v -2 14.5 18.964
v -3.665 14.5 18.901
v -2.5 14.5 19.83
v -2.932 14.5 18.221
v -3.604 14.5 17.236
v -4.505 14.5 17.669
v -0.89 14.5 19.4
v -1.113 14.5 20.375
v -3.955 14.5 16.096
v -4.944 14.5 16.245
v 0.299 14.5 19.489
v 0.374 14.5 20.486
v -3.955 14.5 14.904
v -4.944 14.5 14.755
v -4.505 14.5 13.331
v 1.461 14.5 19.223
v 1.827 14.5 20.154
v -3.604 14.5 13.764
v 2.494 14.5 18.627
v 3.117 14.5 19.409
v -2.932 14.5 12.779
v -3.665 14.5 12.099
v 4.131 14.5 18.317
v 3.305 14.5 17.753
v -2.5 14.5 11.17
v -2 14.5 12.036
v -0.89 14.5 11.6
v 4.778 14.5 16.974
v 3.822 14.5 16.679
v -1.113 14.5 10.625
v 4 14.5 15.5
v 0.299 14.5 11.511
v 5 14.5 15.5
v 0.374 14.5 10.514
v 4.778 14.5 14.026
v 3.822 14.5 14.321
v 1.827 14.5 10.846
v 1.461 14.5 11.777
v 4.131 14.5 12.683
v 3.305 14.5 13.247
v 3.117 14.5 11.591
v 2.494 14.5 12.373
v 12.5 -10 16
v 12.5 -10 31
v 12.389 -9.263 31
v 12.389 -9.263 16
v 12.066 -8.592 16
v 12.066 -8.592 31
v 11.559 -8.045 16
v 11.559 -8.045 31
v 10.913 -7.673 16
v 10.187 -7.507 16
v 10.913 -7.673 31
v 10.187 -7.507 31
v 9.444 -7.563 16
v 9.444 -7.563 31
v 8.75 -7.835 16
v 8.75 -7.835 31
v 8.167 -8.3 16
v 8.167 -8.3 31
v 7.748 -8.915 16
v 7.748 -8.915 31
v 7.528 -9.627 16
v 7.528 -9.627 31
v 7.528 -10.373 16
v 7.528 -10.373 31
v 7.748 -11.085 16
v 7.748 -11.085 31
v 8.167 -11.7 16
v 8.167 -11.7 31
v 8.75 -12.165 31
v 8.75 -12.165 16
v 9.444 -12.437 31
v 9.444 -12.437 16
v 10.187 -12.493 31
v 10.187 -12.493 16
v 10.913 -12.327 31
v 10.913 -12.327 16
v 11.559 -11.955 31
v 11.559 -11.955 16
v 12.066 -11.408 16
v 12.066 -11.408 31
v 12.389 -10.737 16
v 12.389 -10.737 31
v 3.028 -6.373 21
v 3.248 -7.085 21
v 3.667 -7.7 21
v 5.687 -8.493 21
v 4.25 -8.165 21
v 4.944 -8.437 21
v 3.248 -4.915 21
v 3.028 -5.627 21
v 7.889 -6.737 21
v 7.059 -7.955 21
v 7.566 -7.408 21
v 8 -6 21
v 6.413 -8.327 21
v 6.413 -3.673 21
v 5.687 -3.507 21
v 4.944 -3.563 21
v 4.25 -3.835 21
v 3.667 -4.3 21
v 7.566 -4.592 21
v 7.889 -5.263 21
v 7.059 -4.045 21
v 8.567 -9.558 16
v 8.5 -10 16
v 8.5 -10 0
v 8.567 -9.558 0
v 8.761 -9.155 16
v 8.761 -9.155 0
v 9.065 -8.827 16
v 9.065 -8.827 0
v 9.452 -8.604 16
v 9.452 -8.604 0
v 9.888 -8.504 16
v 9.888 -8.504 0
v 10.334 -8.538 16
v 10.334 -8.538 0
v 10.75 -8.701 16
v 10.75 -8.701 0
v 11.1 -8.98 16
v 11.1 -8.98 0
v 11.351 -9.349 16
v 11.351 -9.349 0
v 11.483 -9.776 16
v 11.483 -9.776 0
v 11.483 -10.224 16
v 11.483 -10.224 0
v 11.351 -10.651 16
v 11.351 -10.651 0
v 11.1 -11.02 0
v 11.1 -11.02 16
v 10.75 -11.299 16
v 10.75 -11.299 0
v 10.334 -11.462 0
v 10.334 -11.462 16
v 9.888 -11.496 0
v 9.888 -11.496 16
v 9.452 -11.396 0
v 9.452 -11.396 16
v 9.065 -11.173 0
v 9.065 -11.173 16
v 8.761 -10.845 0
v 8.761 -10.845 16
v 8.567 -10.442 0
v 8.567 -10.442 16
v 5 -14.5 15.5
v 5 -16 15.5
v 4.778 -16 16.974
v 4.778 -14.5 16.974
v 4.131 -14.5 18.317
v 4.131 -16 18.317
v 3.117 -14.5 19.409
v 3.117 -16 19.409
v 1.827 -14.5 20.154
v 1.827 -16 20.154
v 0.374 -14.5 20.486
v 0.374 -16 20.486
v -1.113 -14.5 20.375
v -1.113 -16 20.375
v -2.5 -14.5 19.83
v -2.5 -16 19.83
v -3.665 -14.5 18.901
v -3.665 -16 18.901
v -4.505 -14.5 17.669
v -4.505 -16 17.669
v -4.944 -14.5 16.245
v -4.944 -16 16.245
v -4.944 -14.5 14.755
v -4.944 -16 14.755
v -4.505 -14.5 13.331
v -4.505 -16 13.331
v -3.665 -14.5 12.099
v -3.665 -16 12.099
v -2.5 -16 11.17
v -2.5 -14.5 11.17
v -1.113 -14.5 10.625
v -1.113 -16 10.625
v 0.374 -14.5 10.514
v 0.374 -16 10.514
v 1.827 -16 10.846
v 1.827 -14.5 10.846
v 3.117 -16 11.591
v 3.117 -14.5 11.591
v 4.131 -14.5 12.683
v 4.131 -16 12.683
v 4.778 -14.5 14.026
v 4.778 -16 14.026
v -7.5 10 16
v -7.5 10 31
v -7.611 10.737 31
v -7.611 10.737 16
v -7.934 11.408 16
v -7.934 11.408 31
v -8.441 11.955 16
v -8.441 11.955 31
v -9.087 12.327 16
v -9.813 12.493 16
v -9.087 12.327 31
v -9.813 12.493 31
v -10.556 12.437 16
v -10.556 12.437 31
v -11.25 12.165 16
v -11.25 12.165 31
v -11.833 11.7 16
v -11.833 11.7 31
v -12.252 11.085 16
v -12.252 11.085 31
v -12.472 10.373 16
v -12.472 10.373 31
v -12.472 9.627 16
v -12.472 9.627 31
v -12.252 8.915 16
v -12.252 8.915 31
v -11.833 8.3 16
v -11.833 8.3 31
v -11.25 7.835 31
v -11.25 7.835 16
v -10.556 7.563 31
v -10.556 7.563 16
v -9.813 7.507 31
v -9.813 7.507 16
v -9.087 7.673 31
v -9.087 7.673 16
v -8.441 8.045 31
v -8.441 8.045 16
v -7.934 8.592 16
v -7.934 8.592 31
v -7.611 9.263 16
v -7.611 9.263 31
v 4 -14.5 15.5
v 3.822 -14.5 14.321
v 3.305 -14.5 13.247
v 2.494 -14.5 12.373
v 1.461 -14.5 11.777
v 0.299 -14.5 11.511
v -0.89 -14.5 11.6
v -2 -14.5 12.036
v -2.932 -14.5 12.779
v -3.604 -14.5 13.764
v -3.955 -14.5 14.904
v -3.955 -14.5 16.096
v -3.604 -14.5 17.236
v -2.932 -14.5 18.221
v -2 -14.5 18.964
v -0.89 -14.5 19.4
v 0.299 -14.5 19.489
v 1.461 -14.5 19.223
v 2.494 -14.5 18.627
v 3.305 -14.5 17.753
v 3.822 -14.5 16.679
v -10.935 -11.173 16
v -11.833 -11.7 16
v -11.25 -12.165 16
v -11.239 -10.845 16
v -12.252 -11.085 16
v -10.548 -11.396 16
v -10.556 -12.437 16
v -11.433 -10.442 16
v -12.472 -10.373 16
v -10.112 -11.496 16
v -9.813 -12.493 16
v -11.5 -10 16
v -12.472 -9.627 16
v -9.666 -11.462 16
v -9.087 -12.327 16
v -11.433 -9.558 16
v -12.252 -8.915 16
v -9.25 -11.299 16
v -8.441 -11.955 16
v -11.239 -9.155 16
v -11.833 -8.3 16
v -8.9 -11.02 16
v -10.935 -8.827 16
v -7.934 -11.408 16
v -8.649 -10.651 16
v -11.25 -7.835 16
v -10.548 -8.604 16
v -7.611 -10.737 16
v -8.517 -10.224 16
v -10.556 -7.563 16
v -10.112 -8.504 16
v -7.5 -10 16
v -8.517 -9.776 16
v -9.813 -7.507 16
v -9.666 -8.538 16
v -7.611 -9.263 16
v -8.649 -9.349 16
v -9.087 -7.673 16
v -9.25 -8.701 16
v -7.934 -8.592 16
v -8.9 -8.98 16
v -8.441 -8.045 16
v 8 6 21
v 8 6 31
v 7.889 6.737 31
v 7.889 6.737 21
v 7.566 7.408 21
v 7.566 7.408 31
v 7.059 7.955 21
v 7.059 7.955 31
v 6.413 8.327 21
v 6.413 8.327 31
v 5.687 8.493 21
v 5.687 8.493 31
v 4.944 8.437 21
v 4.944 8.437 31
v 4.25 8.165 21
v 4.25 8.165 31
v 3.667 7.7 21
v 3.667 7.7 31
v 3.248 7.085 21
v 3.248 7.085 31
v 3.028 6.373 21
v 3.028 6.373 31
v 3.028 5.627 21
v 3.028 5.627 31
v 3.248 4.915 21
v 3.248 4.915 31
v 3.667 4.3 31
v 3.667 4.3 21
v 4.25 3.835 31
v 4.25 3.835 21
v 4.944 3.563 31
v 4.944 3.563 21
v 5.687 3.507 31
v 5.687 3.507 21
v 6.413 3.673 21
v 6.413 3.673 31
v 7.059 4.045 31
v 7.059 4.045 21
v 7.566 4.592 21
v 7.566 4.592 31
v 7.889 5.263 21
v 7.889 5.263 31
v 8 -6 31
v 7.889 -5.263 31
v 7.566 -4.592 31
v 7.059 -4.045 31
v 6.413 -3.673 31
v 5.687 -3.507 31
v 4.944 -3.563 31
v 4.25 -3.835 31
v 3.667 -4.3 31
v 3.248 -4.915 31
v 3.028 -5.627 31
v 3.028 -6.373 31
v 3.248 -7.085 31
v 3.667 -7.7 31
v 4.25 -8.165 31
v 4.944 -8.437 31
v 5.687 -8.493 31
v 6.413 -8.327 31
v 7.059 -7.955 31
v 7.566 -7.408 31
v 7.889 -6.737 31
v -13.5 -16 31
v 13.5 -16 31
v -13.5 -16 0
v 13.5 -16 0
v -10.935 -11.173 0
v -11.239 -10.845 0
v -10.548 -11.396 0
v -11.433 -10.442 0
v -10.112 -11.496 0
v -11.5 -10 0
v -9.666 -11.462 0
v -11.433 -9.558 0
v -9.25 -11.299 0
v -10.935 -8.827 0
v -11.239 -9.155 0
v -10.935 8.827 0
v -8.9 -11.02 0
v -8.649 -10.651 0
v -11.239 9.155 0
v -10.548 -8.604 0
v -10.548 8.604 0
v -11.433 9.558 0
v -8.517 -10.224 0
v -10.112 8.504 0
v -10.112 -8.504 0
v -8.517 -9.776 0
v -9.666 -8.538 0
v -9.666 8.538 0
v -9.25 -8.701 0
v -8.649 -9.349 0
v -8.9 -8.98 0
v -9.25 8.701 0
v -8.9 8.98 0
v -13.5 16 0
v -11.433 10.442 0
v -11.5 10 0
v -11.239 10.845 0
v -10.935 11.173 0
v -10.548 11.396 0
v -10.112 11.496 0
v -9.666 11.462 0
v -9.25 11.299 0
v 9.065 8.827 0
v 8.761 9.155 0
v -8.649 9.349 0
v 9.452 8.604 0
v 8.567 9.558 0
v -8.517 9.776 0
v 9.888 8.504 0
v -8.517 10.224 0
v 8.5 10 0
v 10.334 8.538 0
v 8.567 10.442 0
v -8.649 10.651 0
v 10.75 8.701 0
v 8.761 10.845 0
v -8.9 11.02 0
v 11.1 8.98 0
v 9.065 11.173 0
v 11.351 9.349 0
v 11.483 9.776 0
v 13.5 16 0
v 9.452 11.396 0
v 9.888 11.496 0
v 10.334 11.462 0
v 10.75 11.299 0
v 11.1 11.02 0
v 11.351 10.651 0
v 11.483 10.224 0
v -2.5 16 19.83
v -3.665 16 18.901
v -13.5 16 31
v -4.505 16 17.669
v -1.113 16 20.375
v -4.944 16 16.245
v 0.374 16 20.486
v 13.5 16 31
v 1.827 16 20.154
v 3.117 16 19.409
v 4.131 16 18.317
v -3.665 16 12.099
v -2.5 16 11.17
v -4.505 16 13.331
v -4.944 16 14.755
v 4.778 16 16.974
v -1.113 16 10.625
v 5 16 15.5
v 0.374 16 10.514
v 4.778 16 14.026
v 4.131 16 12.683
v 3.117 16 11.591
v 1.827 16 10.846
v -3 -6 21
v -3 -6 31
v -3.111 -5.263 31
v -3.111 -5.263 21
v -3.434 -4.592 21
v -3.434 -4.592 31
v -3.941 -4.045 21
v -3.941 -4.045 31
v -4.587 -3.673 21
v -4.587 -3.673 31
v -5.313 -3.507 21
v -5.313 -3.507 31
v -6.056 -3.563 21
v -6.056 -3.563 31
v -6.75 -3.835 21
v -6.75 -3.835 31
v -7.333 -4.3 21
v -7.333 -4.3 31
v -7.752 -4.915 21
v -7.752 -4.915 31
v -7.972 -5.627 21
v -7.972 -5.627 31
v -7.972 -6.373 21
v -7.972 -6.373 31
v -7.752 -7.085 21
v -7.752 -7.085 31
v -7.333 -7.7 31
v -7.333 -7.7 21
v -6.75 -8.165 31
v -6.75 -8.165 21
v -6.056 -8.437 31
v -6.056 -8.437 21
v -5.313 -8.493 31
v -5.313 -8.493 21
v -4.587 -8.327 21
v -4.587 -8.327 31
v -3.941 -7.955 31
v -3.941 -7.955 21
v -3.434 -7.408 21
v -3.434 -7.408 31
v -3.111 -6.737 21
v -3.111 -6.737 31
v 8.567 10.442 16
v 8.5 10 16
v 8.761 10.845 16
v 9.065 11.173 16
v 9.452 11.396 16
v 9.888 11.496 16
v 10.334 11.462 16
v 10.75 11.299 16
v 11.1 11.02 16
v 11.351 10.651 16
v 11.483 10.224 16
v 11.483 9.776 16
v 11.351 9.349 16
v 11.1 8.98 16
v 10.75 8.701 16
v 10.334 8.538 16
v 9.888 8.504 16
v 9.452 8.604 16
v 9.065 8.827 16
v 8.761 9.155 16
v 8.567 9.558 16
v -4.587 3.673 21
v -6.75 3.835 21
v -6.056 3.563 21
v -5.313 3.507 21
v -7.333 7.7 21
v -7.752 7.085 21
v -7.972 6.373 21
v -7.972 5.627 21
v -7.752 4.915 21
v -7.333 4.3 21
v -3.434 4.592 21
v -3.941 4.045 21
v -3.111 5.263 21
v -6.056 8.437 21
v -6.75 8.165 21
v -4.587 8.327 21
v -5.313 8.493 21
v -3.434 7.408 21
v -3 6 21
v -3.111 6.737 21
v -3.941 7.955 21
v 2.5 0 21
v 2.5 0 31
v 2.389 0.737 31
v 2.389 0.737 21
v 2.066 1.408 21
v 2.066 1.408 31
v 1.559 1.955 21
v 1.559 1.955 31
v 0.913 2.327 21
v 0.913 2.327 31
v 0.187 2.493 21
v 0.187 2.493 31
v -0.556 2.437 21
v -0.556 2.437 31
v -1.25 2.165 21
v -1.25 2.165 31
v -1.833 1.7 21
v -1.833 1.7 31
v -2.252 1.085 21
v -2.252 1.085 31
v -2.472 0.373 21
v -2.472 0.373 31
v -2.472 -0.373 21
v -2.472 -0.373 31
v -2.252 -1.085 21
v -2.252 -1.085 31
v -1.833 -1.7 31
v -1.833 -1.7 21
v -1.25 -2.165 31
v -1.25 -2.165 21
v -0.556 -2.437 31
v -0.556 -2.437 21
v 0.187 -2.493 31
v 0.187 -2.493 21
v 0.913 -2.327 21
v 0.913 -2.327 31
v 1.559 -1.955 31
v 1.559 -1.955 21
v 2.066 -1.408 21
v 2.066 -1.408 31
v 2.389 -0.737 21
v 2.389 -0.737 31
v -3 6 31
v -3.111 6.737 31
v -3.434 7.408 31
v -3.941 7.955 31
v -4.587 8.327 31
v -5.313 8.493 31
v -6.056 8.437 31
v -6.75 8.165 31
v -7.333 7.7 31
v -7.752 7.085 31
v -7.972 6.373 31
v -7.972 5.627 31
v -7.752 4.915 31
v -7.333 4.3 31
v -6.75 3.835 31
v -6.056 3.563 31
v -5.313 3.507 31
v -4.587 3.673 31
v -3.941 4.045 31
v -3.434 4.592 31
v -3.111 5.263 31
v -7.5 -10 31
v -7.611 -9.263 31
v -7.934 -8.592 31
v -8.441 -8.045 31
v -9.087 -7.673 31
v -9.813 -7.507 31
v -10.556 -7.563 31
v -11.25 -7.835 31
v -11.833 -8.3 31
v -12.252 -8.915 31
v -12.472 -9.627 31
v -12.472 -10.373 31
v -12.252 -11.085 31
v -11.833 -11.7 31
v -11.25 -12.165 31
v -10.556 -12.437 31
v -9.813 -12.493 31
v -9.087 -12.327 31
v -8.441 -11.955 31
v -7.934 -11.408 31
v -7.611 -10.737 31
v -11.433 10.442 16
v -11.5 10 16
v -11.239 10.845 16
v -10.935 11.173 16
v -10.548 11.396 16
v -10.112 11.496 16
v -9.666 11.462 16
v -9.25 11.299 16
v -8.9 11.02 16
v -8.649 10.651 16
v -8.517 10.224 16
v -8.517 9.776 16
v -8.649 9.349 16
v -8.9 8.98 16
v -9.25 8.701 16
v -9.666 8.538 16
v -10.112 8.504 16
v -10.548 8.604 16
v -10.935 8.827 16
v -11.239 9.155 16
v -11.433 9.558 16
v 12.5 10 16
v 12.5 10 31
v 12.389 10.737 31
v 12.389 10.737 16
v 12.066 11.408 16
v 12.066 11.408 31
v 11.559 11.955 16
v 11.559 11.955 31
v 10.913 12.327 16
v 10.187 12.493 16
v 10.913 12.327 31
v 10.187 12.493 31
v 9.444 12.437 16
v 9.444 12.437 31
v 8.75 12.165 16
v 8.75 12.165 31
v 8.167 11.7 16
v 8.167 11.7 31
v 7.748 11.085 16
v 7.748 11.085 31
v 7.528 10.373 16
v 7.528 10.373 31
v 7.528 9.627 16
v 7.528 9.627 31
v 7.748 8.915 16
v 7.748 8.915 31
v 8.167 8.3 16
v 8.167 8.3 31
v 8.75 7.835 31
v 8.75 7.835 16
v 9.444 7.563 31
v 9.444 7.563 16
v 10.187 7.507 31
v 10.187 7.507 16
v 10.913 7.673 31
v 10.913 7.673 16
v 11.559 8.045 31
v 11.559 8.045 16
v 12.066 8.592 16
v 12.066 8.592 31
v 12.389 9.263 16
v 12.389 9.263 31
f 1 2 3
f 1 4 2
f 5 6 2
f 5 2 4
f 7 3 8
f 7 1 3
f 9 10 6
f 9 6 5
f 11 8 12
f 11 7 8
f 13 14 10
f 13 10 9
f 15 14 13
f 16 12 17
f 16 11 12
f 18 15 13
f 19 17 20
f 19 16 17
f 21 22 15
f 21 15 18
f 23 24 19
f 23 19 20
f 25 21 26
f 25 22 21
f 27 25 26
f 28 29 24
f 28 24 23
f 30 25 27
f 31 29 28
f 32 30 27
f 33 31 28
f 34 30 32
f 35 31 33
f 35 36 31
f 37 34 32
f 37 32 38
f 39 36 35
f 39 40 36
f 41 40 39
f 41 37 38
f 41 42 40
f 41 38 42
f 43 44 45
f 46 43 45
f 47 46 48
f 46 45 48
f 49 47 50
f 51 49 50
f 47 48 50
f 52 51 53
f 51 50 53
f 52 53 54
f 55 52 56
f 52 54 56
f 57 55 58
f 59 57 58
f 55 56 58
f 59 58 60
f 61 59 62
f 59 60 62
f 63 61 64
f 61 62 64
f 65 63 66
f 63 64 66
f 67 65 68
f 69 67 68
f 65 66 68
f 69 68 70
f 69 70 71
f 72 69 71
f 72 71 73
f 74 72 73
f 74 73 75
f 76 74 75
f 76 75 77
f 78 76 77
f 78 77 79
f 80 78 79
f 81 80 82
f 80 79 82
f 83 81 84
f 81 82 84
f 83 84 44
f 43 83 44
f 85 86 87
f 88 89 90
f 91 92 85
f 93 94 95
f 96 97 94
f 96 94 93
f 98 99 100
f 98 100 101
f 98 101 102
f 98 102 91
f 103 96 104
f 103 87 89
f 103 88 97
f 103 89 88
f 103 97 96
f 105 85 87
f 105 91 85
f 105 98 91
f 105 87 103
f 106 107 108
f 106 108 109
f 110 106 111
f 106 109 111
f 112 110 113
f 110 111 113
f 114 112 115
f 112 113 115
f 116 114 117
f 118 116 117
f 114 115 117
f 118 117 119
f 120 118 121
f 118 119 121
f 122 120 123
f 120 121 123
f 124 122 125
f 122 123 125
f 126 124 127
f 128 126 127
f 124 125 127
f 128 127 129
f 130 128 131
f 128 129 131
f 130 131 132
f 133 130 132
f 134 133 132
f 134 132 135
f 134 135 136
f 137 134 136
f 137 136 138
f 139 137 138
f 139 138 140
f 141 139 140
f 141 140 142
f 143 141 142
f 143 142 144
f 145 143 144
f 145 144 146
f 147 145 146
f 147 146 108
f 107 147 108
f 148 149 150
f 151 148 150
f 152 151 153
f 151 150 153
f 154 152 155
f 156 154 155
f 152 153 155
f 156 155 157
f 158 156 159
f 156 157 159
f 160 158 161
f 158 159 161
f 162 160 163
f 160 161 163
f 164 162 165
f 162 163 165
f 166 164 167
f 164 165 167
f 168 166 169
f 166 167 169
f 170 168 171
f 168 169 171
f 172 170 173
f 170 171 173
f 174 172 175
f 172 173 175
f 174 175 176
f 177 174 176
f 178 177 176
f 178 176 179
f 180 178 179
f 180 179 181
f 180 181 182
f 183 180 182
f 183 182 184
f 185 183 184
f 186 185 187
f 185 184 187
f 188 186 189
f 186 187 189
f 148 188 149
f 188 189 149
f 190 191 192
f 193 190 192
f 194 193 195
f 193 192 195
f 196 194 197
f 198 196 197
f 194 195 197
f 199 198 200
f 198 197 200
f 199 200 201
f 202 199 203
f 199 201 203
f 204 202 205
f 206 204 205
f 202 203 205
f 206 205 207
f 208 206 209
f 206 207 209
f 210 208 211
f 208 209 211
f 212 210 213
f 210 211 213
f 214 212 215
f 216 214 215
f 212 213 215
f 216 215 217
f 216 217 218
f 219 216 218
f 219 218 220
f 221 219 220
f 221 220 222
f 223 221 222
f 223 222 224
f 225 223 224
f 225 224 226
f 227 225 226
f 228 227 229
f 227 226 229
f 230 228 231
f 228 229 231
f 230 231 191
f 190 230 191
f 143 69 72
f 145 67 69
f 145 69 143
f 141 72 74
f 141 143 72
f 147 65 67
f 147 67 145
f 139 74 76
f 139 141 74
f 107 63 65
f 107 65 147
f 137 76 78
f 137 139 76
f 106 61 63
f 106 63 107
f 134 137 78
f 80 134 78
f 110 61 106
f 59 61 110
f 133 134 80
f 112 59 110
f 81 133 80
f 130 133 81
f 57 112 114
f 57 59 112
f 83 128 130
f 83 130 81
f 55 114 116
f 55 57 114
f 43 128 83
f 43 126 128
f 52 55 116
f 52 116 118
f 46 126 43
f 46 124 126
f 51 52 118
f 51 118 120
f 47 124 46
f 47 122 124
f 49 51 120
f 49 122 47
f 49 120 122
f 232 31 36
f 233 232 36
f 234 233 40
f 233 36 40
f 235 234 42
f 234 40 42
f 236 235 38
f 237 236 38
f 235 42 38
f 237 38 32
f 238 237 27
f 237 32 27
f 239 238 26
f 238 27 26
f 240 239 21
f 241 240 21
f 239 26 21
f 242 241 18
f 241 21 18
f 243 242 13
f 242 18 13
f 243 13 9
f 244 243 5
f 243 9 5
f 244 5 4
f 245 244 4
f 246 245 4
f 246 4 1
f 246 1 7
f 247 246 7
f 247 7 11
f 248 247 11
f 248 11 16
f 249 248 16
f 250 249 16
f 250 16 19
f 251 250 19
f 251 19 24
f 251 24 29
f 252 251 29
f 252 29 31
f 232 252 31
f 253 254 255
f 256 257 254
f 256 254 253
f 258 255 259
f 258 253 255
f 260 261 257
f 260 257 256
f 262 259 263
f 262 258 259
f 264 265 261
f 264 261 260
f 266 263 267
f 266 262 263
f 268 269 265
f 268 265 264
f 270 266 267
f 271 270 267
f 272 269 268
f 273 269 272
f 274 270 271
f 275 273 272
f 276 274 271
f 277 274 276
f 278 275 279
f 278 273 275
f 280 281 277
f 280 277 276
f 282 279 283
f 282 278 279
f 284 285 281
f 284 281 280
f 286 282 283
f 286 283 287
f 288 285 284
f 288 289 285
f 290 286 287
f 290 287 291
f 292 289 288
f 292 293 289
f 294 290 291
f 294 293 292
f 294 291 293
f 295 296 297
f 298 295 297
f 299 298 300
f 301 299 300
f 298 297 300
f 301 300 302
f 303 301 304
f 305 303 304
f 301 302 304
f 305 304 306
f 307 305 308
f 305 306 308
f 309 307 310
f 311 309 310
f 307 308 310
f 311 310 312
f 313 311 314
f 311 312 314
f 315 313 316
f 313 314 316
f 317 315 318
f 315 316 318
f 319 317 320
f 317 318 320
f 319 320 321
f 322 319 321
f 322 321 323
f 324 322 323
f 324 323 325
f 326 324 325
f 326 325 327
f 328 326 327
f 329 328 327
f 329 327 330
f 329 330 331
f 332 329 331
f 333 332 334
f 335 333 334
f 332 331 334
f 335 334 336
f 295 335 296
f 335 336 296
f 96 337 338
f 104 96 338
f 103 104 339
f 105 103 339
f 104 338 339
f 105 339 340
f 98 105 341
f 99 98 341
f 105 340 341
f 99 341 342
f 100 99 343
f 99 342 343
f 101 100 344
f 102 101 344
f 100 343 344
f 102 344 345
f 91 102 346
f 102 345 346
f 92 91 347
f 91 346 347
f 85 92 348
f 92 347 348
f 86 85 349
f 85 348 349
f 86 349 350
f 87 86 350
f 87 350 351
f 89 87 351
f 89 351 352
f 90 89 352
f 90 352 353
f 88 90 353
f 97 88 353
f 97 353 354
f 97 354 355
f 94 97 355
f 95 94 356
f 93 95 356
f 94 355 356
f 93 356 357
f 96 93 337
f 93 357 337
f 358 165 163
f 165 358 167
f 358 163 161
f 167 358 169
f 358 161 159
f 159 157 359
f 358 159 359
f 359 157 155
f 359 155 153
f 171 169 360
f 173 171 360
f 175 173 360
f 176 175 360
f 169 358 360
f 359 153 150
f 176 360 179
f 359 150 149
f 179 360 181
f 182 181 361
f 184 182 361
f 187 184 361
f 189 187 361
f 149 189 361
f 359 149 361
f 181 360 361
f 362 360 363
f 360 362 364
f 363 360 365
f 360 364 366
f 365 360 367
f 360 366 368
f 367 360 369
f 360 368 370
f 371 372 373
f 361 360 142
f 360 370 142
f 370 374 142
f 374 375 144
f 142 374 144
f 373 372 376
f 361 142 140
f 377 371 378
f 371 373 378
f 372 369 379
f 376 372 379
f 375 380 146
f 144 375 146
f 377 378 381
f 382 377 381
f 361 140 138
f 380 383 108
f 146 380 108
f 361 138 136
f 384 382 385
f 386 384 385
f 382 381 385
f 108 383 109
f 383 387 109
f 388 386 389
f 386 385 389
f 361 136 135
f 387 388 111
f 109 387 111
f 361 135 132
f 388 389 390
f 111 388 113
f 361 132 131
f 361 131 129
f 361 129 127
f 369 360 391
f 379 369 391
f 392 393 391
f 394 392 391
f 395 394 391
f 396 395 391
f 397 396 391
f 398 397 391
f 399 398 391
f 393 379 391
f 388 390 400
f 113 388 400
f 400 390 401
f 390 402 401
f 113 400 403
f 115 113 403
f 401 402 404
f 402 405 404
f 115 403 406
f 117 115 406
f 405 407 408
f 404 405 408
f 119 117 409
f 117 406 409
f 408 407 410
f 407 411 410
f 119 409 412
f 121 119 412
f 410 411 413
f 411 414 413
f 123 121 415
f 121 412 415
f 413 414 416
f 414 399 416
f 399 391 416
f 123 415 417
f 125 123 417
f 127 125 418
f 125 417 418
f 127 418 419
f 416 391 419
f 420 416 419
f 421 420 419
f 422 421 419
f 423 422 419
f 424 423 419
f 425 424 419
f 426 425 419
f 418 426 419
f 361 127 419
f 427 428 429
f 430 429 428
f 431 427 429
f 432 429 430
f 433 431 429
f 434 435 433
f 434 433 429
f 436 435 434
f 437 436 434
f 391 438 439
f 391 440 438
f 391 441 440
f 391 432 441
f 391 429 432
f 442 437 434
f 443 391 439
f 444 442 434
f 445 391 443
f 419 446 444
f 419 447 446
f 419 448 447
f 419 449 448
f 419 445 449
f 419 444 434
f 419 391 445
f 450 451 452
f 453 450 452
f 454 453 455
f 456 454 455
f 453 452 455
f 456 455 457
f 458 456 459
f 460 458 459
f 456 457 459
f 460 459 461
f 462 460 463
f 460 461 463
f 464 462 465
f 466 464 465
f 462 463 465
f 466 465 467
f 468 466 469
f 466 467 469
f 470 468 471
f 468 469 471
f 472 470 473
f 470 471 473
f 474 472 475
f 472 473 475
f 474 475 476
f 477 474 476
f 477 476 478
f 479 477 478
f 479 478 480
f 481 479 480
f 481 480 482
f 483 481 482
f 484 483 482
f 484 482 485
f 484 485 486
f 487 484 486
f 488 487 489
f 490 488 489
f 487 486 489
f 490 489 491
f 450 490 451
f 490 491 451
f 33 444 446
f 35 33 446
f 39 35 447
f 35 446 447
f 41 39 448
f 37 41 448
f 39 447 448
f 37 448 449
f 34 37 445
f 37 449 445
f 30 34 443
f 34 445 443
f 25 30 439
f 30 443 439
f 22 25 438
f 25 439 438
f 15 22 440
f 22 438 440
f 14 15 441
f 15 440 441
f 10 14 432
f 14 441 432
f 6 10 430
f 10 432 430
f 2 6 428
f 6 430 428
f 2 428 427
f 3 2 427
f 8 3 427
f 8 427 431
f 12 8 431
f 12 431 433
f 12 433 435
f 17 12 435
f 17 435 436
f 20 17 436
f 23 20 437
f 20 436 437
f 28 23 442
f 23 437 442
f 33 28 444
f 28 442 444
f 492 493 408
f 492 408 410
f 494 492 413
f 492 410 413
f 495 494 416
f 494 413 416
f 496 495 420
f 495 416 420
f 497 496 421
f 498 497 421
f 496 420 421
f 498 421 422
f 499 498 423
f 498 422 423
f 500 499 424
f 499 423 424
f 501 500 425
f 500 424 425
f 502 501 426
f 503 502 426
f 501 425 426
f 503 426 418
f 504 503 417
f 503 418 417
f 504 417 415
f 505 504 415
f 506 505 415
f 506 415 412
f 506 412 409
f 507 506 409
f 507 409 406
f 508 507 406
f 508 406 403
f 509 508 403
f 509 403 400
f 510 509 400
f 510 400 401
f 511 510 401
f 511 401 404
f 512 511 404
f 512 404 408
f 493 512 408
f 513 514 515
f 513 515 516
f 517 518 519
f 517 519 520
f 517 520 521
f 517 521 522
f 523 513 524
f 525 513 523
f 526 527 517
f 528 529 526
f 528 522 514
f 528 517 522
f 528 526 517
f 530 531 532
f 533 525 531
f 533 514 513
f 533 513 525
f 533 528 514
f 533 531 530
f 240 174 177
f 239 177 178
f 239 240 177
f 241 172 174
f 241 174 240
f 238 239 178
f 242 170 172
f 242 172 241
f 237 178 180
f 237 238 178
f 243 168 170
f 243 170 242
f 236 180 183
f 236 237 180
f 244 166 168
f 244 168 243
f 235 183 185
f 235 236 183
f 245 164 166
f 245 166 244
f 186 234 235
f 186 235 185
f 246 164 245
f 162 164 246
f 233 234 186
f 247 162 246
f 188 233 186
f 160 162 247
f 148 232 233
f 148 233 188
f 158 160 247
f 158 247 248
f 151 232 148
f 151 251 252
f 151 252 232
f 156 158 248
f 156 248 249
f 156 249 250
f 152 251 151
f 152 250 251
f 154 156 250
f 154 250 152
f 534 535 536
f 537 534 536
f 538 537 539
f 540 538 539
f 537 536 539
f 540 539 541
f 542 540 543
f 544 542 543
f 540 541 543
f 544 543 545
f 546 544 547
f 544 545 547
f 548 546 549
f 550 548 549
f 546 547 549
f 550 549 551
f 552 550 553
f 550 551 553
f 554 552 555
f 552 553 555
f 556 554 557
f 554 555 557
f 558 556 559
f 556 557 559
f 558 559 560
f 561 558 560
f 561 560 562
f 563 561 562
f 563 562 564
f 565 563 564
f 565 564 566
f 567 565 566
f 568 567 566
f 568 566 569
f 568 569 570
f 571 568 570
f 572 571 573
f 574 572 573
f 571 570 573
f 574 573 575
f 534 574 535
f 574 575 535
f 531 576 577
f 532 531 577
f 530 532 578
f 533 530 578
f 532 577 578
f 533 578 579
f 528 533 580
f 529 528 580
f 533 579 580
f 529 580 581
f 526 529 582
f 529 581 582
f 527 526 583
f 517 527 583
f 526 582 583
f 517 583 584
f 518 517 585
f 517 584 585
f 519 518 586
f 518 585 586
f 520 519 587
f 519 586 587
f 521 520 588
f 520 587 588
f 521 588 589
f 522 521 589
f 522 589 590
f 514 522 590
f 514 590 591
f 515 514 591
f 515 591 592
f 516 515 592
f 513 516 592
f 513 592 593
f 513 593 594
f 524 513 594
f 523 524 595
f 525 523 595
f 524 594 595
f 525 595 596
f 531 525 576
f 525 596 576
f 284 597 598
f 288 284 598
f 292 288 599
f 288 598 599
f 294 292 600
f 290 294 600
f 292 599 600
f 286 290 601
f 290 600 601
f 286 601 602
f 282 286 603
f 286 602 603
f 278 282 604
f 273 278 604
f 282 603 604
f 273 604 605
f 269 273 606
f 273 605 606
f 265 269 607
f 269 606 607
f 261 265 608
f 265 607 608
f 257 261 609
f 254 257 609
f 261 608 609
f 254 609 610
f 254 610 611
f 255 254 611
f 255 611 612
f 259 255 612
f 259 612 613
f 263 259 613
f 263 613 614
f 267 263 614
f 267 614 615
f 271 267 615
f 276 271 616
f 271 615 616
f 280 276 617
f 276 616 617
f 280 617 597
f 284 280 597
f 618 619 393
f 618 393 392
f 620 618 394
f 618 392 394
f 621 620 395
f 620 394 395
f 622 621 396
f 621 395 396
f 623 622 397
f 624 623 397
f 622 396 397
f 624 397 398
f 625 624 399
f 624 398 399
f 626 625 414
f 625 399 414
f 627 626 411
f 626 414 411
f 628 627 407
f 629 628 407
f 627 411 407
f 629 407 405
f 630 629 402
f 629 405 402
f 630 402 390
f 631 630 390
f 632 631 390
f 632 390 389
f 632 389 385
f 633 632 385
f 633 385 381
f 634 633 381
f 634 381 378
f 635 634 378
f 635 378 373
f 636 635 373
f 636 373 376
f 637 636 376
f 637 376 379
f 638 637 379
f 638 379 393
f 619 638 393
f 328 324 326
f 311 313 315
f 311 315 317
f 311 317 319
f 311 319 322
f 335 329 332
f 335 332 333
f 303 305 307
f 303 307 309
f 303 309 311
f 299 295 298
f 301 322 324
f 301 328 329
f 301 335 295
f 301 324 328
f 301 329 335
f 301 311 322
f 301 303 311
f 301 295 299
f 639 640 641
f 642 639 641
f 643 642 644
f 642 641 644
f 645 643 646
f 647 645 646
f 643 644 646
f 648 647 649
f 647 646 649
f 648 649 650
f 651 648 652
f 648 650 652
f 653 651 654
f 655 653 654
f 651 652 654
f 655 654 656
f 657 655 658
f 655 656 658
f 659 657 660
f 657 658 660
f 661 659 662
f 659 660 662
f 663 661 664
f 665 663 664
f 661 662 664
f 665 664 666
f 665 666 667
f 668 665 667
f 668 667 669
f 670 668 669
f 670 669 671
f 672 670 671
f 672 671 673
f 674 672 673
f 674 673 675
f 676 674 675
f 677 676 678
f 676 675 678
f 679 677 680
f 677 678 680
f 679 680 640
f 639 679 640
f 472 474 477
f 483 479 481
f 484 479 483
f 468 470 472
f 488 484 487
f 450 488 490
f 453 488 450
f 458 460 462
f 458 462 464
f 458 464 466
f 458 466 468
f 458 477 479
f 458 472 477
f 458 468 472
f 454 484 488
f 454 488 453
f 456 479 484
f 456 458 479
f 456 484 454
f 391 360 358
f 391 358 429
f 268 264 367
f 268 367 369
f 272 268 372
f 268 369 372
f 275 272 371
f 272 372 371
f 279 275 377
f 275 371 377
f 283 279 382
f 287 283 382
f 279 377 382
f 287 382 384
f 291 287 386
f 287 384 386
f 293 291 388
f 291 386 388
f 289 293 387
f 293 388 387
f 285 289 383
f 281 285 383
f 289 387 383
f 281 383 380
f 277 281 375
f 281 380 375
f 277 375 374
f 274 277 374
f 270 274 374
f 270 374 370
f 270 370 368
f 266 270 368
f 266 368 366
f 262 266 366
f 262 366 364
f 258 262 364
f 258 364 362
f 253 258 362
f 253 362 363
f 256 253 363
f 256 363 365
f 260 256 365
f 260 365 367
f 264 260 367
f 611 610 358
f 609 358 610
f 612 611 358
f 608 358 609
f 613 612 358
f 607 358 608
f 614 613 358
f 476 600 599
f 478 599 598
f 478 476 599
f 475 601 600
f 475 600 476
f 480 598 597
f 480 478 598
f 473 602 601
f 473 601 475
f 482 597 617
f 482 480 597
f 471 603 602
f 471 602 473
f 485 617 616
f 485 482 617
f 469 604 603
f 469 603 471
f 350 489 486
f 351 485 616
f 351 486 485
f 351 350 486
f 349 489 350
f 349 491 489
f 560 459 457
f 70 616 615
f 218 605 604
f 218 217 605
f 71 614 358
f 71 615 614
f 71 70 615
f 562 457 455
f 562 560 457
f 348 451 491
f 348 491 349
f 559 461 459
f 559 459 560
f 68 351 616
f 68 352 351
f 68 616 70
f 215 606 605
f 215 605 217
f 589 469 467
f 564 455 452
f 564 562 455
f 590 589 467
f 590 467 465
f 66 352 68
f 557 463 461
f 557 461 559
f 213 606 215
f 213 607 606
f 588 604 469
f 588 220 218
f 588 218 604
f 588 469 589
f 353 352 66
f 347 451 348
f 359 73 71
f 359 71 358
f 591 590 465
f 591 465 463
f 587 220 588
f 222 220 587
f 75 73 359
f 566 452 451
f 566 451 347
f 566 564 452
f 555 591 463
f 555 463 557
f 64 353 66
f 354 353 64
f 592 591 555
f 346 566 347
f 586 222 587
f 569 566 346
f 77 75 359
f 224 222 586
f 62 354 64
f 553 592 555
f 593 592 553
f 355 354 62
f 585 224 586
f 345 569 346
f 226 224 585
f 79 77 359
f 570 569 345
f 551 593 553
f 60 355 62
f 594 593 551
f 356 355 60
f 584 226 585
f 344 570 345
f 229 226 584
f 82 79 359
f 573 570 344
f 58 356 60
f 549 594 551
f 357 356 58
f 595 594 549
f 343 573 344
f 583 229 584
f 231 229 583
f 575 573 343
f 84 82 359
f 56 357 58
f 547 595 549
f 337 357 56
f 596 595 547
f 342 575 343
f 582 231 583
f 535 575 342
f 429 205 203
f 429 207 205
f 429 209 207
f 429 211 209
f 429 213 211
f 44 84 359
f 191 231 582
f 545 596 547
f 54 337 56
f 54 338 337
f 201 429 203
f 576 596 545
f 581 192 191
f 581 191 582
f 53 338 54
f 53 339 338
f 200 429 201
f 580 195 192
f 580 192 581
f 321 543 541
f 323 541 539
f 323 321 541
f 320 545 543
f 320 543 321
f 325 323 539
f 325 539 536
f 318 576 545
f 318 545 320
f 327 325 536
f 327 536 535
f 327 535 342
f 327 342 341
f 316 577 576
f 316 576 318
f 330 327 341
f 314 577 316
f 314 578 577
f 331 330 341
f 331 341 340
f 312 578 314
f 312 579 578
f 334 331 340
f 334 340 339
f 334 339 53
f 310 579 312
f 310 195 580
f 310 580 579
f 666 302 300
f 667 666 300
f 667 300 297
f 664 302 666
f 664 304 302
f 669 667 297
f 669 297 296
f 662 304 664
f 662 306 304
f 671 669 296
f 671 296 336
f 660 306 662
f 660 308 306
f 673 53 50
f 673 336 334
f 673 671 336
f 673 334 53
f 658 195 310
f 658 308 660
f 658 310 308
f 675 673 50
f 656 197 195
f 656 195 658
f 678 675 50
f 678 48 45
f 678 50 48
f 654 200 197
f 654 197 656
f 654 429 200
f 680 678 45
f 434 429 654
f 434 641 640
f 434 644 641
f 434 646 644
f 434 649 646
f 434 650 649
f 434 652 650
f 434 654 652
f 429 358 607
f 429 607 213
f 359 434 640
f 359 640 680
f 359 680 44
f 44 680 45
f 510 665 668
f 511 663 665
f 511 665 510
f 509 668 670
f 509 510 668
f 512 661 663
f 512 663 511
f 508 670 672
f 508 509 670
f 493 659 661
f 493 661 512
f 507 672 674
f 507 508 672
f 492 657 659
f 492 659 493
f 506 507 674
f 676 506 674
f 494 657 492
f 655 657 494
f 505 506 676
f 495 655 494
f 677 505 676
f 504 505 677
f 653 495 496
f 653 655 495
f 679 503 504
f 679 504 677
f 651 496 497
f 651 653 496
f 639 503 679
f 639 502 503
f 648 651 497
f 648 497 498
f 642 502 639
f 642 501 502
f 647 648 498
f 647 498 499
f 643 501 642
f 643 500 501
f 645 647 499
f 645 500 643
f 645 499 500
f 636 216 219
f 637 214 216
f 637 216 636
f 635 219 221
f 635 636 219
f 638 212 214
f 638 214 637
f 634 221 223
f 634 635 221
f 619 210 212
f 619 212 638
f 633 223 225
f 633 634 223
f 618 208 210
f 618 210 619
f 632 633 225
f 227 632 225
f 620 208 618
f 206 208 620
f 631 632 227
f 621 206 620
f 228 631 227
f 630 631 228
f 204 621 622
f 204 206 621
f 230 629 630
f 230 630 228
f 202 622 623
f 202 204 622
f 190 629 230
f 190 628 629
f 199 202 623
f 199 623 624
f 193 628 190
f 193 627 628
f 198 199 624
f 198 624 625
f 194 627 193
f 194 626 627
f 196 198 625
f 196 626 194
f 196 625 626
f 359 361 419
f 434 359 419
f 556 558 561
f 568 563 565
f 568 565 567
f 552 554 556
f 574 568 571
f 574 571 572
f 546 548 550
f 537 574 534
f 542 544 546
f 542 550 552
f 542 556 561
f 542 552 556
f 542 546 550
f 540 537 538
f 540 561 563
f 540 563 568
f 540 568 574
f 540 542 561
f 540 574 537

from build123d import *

# Parameters (mm, degrees)
SCHIZZO1_W                   = 27
SCHIZZO1_H                   = 32
ESTRUSIONE_ESTRUSIONE1_DEPTH = 31
SCHIZZO2_R                   = 1.5
TAGLIO_ESTRUSIONE1_DEPTH     = 32
SCHIZZO3_R                   = 4
TAGLIO_ESTRUSIONE2_DEPTH     = 33
SCHIZZO4_R                   = 5
TAGLIO_ESTRUSIONE5_DEPTH     = 1.5
SCHIZZO5_R                   = 5
TAGLIO_ESTRUSIONE6_DEPTH     = 1.5
SCHIZZO6_R                   = 2.5
TAGLIO_ESTRUSIONE7_DEPTH     = 15
SCHIZZO7_R                   = 2.5
TAGLIO_ESTRUSIONE8_DEPTH     = 10


with BuildPart() as part:
    # Schizzo1 → Estrusione-Estrusione1 (new body)
    with BuildSketch(Plane.XY):
        Rectangle(SCHIZZO1_W, SCHIZZO1_H)
    extrude(amount=ESTRUSIONE_ESTRUSIONE1_DEPTH)

    # Schizzo2 → Taglio-Estrusione1 (cut, through all)
    with BuildSketch(Plane(origin=(0, 0, 0), x_dir=(-1, 0, 0), z_dir=(0, 0, -1))):
        with Locations((-10, 10)):
            Circle(SCHIZZO2_R)
        with Locations((10, 10)):
            Circle(SCHIZZO2_R)
        with Locations((10, -10)):
            Circle(SCHIZZO2_R)
        with Locations((-10, -10)):
            Circle(SCHIZZO2_R)
    extrude(amount=-TAGLIO_ESTRUSIONE1_DEPTH, mode=Mode.SUBTRACT)

    # Schizzo3 → Taglio-Estrusione2 (cut, through all)
    with BuildSketch(Plane(origin=(0, 16, 0), x_dir=(1, 0, 0), z_dir=(0, 1, 0))):
        with Locations((0, -15.5)):
            Circle(SCHIZZO3_R)
    extrude(amount=-TAGLIO_ESTRUSIONE2_DEPTH, mode=Mode.SUBTRACT)

    # Schizzo4 → Taglio-Estrusione5 (cut)
    with BuildSketch(Plane(origin=(0, 16, 0), x_dir=(1, 0, 0), z_dir=(0, 1, 0))):
        with Locations((0, -15.5)):
            Circle(SCHIZZO4_R)
    extrude(amount=-TAGLIO_ESTRUSIONE5_DEPTH, mode=Mode.SUBTRACT)

    # Schizzo5 → Taglio-Estrusione6 (cut)
    with BuildSketch(Plane.XZ.offset(16)):
        with Locations((0, 15.5)):
            Circle(SCHIZZO5_R)
    extrude(amount=-TAGLIO_ESTRUSIONE6_DEPTH, mode=Mode.SUBTRACT)

    # Schizzo6 → Taglio-Estrusione7 (cut)
    with BuildSketch(Plane.XY.offset(31)):
        with Locations((-10, 10)):
            Circle(SCHIZZO6_R)
        with Locations((10, 10)):
            Circle(SCHIZZO6_R)
        with Locations((10, -10)):
            Circle(SCHIZZO6_R)
        with Locations((-10, -10)):
            Circle(SCHIZZO6_R)
    extrude(amount=-TAGLIO_ESTRUSIONE7_DEPTH, mode=Mode.SUBTRACT)

    # Schizzo7 → Taglio-Estrusione8 (cut)
    with BuildSketch(Plane.XY.offset(31)):
        with Locations((-5.5, 6)):
            Circle(SCHIZZO7_R)
        with Locations((5.5, 6)):
            Circle(SCHIZZO7_R)
        Circle(SCHIZZO7_R)
        with Locations((5.5, -6)):
            Circle(SCHIZZO7_R)
        with Locations((-5.5, -6)):
            Circle(SCHIZZO7_R)
    extrude(amount=-TAGLIO_ESTRUSIONE8_DEPTH, mode=Mode.SUBTRACT)


solid = part.part
